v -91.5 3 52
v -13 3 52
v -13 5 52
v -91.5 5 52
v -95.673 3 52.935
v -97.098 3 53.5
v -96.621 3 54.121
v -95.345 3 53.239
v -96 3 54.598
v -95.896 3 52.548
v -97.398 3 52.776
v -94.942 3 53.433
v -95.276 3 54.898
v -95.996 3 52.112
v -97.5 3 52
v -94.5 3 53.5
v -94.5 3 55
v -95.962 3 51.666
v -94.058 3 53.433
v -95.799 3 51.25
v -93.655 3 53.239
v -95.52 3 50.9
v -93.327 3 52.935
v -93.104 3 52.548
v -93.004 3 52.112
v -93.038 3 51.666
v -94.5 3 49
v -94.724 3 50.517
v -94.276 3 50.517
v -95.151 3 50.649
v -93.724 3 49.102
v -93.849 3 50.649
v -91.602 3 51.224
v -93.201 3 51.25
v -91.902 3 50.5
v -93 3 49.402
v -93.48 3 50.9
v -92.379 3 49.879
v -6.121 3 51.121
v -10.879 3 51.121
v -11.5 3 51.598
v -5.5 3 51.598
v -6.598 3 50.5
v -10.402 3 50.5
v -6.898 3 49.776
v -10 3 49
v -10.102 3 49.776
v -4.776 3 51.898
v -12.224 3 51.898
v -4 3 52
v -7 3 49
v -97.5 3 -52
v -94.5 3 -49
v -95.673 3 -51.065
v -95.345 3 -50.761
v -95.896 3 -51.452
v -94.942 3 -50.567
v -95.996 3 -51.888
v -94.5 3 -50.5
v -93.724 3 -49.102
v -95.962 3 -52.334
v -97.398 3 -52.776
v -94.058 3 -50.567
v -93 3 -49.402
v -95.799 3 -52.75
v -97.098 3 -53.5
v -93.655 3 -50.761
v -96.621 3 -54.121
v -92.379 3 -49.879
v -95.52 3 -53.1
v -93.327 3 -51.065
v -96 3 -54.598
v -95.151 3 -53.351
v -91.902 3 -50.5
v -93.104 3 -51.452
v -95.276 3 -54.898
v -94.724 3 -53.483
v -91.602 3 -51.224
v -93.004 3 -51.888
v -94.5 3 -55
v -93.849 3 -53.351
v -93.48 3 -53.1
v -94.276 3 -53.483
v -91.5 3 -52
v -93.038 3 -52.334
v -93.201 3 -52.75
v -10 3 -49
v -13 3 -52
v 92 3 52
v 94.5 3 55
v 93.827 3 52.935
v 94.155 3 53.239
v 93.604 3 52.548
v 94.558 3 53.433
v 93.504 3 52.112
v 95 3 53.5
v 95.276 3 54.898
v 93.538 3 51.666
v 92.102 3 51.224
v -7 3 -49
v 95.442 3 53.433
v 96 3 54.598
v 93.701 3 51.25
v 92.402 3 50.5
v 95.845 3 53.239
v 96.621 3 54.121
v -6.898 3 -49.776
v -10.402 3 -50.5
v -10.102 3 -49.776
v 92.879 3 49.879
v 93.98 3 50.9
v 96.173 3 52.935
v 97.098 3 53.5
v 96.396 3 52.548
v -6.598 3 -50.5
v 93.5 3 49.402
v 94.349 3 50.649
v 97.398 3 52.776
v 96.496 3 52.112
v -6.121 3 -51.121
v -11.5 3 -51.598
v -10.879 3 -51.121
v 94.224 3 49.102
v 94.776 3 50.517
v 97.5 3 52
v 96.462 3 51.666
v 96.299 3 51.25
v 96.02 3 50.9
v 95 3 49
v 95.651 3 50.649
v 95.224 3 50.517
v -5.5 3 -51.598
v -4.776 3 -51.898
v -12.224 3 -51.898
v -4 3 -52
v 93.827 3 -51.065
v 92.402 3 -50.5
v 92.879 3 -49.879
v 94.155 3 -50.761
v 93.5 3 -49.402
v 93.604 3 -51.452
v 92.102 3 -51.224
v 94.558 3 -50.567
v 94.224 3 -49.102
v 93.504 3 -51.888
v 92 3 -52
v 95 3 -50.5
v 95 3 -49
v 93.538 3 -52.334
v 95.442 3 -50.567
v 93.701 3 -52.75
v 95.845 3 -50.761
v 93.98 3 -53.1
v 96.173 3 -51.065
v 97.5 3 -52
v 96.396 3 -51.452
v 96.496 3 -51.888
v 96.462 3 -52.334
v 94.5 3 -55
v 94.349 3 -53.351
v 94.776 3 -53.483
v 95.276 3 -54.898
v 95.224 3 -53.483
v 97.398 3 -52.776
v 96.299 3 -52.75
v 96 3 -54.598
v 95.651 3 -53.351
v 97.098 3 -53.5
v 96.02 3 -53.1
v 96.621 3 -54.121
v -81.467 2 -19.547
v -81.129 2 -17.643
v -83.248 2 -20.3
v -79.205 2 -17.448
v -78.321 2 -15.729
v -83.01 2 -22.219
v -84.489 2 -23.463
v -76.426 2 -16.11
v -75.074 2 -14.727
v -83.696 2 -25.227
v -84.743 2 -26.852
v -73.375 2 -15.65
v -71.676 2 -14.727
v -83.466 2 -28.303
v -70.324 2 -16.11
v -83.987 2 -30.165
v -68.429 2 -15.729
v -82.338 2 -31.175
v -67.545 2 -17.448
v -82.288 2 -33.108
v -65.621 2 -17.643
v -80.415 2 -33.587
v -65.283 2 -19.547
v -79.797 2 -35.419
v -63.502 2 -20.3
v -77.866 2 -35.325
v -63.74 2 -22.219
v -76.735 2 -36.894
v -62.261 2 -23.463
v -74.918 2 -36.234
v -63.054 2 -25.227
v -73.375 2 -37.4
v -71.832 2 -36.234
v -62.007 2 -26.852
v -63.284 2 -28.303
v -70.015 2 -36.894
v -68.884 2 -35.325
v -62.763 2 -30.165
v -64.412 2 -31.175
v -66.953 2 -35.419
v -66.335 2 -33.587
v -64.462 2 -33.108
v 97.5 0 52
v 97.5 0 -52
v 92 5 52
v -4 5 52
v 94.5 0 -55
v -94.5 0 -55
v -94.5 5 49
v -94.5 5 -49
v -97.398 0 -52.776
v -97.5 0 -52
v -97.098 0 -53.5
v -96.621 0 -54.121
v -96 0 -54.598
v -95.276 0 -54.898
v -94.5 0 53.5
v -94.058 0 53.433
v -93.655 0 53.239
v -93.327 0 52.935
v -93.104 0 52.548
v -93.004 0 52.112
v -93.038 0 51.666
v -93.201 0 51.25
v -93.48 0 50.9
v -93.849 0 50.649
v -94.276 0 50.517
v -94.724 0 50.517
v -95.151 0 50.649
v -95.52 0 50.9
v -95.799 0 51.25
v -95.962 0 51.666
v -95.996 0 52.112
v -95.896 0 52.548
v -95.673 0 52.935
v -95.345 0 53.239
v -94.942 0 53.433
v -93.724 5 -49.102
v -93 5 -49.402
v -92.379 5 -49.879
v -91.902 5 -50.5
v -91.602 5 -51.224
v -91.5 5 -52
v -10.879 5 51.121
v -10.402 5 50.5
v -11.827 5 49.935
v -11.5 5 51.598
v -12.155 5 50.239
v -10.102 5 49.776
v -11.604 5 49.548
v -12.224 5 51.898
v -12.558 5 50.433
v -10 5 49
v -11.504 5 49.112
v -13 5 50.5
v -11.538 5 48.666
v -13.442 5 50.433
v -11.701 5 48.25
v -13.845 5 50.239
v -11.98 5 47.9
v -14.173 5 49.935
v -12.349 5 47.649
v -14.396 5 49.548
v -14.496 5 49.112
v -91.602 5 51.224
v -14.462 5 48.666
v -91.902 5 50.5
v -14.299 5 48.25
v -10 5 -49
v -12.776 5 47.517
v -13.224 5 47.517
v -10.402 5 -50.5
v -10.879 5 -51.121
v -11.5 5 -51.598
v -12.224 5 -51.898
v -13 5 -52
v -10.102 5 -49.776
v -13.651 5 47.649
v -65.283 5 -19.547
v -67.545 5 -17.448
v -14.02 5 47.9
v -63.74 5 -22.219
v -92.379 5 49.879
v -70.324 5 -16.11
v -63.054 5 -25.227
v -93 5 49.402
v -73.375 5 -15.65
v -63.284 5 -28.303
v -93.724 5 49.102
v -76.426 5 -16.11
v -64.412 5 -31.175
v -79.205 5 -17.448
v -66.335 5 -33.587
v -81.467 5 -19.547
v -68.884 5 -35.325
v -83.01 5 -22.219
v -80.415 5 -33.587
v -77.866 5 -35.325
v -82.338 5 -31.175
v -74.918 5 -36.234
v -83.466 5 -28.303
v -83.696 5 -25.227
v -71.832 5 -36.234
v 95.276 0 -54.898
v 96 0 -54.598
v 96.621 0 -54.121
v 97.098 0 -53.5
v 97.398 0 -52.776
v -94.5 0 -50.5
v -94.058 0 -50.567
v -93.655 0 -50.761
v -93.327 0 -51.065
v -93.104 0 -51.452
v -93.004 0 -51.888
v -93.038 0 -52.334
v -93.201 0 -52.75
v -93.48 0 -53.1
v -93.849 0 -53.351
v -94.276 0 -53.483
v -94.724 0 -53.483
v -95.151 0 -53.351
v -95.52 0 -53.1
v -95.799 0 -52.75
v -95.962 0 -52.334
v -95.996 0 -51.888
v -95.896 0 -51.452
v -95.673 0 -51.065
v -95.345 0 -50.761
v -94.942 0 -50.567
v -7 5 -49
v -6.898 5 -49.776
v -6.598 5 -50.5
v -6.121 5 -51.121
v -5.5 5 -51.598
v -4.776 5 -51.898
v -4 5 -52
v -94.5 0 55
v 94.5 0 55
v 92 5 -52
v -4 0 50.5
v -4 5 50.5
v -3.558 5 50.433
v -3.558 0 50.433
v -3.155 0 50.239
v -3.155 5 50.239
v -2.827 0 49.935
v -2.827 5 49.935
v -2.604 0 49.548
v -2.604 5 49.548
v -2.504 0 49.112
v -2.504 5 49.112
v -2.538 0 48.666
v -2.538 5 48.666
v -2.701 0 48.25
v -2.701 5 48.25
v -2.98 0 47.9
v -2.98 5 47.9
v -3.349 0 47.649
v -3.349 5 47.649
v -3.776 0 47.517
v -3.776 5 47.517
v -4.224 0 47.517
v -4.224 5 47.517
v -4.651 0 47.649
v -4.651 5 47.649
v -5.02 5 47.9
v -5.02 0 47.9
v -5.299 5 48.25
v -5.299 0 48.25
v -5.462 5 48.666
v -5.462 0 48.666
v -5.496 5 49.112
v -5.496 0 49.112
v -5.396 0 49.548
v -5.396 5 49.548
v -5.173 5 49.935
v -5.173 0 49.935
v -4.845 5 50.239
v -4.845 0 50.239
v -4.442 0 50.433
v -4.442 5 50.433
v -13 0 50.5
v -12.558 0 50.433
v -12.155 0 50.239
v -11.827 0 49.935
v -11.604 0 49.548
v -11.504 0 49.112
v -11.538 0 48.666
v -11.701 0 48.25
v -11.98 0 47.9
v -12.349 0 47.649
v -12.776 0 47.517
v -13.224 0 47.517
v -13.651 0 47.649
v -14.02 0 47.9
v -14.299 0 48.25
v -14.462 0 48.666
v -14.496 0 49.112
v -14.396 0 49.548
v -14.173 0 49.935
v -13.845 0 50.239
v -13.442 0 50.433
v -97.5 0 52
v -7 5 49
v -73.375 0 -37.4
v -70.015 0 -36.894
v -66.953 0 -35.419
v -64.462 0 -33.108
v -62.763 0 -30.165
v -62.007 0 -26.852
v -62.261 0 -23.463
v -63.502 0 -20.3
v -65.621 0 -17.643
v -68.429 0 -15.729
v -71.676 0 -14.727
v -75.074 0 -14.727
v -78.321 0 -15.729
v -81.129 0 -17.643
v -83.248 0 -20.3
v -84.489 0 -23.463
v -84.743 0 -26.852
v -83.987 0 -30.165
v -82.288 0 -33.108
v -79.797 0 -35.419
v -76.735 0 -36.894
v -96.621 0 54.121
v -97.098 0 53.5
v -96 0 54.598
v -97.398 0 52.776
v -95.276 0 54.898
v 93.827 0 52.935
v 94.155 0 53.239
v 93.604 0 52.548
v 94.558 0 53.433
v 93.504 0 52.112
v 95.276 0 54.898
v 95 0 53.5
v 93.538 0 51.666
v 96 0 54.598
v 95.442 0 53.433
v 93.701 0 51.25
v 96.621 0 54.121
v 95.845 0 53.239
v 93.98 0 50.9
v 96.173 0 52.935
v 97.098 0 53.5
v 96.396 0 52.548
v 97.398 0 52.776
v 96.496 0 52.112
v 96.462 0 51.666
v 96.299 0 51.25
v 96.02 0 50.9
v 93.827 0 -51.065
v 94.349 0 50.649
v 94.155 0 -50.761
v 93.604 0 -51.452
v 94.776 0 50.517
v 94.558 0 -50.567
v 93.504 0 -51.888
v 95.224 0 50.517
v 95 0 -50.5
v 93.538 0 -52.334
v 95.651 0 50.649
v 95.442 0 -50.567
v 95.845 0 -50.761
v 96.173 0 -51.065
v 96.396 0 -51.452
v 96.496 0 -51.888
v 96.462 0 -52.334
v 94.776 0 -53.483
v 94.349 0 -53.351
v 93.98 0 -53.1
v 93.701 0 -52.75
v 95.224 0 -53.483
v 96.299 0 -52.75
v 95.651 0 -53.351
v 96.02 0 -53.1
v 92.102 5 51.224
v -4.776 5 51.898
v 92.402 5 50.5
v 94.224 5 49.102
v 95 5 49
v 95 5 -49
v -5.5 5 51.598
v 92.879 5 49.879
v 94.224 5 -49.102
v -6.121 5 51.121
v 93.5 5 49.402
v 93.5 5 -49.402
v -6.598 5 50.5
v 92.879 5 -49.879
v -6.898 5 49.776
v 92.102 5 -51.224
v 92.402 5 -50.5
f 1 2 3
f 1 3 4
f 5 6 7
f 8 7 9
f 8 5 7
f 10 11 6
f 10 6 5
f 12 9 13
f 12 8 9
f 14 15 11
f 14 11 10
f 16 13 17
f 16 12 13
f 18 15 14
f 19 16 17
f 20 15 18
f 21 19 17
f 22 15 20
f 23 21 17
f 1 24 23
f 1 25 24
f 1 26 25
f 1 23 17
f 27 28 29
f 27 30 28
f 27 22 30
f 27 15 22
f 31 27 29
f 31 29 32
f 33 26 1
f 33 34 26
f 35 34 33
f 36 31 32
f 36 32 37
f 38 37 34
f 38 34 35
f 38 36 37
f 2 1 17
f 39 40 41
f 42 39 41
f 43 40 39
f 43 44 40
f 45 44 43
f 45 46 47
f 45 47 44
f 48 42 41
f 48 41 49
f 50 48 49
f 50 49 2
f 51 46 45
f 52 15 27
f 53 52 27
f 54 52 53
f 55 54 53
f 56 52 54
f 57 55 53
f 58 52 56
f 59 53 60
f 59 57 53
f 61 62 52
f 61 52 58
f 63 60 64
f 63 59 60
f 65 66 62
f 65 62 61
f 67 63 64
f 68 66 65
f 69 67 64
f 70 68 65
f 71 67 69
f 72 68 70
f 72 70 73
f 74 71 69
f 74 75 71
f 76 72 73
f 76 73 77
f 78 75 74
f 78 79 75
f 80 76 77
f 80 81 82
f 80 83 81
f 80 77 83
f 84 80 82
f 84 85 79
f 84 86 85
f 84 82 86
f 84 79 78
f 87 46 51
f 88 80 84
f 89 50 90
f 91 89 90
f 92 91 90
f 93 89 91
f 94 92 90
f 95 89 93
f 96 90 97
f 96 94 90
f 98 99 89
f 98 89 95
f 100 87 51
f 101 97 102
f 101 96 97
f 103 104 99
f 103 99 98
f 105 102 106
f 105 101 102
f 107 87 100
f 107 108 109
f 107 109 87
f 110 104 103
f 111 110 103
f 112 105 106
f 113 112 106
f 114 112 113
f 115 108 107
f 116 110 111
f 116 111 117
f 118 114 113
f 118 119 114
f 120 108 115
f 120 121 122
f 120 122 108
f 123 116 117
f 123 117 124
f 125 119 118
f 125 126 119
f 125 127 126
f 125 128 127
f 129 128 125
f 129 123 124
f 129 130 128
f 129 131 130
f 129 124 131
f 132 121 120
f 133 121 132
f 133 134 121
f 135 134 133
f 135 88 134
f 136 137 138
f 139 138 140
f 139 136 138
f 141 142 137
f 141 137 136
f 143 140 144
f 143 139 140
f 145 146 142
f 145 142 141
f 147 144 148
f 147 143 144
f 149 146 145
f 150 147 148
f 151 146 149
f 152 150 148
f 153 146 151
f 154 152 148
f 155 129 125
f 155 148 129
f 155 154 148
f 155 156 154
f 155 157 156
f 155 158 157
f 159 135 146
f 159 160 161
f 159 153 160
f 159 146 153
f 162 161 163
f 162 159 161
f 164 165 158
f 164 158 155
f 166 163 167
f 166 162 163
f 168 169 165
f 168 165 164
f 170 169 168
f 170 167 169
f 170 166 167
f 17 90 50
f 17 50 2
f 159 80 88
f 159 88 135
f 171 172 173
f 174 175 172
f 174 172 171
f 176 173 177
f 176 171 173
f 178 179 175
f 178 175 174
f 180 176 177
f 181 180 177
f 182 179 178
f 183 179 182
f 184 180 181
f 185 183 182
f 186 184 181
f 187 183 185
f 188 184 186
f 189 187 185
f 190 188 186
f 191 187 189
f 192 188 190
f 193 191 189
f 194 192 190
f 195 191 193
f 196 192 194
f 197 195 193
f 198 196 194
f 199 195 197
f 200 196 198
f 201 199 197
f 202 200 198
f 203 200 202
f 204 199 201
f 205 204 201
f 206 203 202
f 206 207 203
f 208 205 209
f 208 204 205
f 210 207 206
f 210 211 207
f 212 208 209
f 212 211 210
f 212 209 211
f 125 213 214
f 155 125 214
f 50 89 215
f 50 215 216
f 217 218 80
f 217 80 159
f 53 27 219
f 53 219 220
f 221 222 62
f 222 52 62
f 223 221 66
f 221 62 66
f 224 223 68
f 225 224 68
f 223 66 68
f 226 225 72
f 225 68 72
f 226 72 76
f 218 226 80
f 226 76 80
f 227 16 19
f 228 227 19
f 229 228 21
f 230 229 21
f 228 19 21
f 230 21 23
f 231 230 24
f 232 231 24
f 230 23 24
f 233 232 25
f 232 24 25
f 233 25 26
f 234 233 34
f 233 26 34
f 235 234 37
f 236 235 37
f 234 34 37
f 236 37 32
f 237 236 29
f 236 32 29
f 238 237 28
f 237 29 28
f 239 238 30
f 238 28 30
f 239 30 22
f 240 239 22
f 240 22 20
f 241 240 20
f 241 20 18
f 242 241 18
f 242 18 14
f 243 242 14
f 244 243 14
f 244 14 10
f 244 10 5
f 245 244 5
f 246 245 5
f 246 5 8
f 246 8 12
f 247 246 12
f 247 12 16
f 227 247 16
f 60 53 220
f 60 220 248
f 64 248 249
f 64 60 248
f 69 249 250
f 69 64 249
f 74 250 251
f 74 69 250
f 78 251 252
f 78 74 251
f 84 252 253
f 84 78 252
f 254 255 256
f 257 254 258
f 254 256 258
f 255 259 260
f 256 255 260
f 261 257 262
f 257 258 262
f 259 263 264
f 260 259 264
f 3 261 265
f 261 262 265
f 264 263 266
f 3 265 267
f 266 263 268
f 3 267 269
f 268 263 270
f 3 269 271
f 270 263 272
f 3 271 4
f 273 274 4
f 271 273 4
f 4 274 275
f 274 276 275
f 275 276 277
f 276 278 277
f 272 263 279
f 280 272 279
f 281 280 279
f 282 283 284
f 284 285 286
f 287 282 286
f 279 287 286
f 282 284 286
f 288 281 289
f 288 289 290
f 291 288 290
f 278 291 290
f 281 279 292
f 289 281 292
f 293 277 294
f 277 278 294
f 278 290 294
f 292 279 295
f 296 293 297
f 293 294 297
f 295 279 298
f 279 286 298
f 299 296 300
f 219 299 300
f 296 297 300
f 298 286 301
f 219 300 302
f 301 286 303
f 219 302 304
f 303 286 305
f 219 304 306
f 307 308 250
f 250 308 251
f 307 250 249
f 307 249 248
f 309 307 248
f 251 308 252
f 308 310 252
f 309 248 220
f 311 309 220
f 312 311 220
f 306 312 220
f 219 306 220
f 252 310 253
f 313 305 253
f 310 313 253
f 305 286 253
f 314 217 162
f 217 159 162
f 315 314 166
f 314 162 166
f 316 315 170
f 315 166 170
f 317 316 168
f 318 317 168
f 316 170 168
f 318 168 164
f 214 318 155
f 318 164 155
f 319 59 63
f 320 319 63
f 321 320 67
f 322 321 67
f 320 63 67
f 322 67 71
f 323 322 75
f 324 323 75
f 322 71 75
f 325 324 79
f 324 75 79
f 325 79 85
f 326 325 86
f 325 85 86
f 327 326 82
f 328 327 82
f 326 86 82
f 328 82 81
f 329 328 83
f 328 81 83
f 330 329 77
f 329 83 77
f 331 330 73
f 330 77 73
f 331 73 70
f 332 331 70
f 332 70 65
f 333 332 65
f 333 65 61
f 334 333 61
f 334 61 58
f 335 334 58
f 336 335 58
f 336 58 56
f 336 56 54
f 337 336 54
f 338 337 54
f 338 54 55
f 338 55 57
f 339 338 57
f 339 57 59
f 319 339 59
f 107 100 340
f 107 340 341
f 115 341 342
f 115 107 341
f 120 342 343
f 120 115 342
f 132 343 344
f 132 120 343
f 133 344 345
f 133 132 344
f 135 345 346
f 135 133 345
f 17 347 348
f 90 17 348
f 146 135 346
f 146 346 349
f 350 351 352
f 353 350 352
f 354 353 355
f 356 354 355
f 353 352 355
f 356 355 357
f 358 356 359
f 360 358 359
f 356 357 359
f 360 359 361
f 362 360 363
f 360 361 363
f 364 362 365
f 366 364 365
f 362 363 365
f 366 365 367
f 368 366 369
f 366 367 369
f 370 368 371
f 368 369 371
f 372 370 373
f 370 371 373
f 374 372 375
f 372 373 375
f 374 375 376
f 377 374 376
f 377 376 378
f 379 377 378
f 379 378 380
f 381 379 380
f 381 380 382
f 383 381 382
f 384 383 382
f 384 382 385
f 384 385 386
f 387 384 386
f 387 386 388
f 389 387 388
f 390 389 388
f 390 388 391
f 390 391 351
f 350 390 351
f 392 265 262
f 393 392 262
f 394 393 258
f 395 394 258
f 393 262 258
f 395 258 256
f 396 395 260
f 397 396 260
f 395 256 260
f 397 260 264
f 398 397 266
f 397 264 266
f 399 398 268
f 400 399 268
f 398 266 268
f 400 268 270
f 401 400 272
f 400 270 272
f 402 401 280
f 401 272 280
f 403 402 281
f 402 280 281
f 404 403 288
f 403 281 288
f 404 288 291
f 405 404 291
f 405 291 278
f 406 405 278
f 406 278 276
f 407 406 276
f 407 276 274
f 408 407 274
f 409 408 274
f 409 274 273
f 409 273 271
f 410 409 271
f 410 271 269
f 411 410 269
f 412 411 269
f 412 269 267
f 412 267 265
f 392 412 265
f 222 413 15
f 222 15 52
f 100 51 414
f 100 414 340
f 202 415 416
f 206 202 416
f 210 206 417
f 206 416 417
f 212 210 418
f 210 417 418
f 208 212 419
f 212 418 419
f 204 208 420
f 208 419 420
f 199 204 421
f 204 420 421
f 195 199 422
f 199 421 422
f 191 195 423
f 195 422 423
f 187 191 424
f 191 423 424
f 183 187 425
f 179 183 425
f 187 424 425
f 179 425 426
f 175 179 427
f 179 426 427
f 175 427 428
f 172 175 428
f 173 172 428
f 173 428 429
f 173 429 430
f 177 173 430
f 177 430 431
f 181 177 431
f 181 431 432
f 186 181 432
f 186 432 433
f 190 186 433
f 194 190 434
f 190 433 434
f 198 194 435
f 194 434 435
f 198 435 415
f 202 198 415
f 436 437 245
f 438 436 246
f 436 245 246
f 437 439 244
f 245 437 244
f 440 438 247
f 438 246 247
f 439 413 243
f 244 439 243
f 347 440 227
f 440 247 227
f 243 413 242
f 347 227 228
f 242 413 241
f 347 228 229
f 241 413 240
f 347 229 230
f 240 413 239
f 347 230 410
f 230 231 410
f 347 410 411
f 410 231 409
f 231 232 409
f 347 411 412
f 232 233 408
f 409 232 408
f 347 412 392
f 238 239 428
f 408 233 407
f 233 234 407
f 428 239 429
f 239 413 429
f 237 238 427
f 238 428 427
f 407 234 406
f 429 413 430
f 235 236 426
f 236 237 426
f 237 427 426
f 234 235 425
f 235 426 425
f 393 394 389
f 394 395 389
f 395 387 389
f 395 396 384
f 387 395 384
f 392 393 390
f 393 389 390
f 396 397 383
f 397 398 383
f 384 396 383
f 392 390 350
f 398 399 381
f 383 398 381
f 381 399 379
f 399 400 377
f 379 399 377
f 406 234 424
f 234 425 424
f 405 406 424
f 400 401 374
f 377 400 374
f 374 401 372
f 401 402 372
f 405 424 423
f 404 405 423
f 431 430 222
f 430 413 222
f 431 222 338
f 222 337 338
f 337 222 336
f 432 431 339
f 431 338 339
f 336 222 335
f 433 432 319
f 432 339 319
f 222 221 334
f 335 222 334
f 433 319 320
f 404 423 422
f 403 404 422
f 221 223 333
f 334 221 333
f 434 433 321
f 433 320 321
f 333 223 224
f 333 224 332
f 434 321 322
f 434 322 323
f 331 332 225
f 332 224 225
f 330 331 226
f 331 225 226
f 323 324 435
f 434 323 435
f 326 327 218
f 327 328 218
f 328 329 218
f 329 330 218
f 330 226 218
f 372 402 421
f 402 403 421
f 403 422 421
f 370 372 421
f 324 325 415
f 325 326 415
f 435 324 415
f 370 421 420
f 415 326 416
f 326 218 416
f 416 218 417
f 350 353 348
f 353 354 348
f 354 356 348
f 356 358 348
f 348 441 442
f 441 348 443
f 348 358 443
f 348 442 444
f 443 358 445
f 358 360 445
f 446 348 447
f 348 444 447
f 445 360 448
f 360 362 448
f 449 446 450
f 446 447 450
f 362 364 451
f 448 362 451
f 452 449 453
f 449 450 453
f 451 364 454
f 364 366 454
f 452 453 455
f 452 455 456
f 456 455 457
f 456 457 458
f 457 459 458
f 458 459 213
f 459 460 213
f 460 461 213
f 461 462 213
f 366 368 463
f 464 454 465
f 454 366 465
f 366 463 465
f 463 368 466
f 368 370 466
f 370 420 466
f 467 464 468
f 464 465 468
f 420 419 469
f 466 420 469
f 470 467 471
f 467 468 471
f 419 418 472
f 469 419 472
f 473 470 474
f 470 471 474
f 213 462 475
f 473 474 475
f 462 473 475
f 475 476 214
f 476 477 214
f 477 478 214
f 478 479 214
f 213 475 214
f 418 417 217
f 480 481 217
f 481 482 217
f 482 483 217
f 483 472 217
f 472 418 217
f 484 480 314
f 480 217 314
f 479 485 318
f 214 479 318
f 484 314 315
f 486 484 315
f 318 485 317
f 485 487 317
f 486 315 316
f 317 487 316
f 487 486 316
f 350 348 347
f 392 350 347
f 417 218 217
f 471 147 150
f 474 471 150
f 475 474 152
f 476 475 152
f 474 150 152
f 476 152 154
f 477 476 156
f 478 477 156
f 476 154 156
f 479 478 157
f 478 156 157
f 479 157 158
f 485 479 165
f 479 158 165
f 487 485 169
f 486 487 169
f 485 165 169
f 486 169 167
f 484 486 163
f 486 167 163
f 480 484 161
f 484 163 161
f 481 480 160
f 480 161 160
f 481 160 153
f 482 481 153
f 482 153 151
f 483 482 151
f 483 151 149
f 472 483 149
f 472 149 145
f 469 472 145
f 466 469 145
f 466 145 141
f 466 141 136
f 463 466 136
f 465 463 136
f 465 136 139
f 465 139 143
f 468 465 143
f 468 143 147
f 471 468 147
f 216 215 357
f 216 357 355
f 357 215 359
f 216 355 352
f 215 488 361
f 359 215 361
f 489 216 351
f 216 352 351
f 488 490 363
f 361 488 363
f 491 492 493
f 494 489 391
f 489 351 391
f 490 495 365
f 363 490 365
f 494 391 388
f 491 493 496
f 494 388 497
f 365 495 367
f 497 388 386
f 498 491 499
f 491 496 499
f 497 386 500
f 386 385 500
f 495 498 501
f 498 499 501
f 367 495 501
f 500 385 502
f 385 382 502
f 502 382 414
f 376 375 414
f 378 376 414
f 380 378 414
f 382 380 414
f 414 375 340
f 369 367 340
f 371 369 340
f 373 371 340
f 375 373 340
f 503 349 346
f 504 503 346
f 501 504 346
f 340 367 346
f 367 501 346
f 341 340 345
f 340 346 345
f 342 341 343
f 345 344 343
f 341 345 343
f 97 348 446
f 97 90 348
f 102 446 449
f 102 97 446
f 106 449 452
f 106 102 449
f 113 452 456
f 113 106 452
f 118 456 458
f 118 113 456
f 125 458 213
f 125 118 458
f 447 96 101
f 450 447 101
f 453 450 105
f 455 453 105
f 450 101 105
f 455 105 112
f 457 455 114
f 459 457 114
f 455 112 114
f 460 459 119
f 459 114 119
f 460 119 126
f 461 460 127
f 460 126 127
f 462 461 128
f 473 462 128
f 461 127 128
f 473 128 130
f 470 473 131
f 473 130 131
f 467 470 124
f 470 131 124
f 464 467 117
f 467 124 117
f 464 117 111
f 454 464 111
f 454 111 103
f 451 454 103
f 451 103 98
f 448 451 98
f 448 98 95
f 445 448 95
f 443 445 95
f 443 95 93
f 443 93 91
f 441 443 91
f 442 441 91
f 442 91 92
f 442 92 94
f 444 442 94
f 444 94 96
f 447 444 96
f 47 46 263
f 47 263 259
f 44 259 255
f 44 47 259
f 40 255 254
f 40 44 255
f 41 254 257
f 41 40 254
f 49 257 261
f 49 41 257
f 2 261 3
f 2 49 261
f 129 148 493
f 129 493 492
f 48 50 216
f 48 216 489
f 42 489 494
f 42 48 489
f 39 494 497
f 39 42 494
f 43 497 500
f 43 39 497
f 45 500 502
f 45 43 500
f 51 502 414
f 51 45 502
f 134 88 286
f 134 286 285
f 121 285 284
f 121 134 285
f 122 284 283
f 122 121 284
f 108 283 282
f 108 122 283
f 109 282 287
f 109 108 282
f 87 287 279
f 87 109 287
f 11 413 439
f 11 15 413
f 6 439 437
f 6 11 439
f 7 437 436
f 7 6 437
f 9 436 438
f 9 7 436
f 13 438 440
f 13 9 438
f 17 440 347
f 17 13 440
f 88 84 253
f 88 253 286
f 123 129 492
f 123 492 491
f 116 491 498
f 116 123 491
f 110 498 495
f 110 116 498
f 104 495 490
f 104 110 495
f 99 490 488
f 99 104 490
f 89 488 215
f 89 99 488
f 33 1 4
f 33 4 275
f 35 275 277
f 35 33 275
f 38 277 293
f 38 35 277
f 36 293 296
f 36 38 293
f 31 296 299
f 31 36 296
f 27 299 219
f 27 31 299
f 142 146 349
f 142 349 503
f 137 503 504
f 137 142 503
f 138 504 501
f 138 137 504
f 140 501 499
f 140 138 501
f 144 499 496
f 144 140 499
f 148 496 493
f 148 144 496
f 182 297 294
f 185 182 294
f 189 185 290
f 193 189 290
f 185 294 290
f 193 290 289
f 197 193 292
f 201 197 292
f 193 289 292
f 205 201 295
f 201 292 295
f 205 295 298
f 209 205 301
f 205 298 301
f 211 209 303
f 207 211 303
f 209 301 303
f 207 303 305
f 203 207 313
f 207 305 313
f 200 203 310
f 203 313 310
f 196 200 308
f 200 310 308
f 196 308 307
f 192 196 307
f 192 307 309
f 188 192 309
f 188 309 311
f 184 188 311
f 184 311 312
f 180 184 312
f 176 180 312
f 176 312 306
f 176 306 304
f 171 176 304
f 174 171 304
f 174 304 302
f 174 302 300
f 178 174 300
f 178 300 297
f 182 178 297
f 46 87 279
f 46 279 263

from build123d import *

# Parameters (mm, degrees)
SKETCH1_W           = 195
SKETCH1_H           = 110
BOSS_EXTRUDE1_DEPTH = 3
BOSS_EXTRUDE2_DEPTH = 2
SKETCH4_R           = 1.5
CUT_EXTRUDE2_DEPTH  = 112.983257677
FILLET1_R           = 3
SKETCH5_R           = 1.5
CUT_EXTRUDE3_DEPTH  = 113.054674155
SKETCH6_R           = 10.35
CUT_EXTRUDE4_DEPTH  = 113.054674155
SKETCH7_R           = 11.4
CUT_EXTRUDE5_DEPTH  = 2


with BuildPart() as part:
    # Sketch1 → Boss-Extrude1 (new body)
    with BuildSketch(Plane(origin=(0, 0, 0), x_dir=(1, 0, 0), z_dir=(0, 1, 0))):
        Rectangle(SKETCH1_W, SKETCH1_H)
    extrude(amount=BOSS_EXTRUDE1_DEPTH)

    # Sketch2 → Boss-Extrude2 (add)
    with BuildSketch(Plane(origin=(0, 3, 0), x_dir=(1, 0, 0), z_dir=(0, 1, 0))):
        with BuildLine():
            Line((-94.5, 0), (-94.5, 49))
            ThreePointArc((-94.5, 49), (-92.378679656, 49.878679656), (-91.5, 52))
            Line((-91.5, 52), (-13, 52))
            ThreePointArc((-13, 52), (-10.878679656, 51.121320344), (-10, 49))
            Line((-10, 49), (-10, -49))
            ThreePointArc((-10, -49), (-10.878679656, -51.121320344), (-13, -52))
            Line((-13, -52), (-91.5, -52))
            ThreePointArc((-91.5, -52), (-92.378679656, -49.878679656), (-94.5, -49))
            Line((-94.5, -49), (-94.5, 0))
        make_face()
        with BuildLine():
            Line((-7, 0), (-7, 49))
            ThreePointArc((-7, 49), (-6.121320344, 51.121320344), (-4, 52))
            Line((-4, 52), (92, 52))
            ThreePointArc((92, 52), (92.878679656, 49.878679656), (95, 49))
            Line((95, 49), (95, -49))
            ThreePointArc((95, -49), (92.878679656, -49.878679656), (92, -52))
            Line((92, -52), (-4, -52))
            ThreePointArc((-4, -52), (-6.121320344, -51.121320344), (-7, -49))
            Line((-7, -49), (-7, 0))
        make_face()
    extrude(amount=BOSS_EXTRUDE2_DEPTH)

    # Sketch4 → Cut-Extrude2 (cut, through all)
    with BuildSketch(Plane(origin=(0, 3, 0), x_dir=(1, 0, 0), z_dir=(0, 1, 0))):
        with Locations(Location((-94.5, 52, 0), (0, 0, 270))):
            Circle(SKETCH4_R)
        with Locations(Location((95, 52, 0), (0, 0, 270))):
            Circle(SKETCH4_R)
        with Locations(Location((95, -52, 0), (0, 0, 270))):
            Circle(SKETCH4_R)
        with Locations(Location((-94.5, -52, 0), (0, 0, 270))):
            Circle(SKETCH4_R)
    extrude(amount=-CUT_EXTRUDE2_DEPTH, mode=Mode.SUBTRACT)

    # Fillet1
    fillet1_edges = [part.edges().sort_by_distance(p)[0] for p in [
        (97.5, 1.5, 55),
        (-97.5, 1.5, 55),
        (-97.5, 1.5, -55),
        (97.5, 1.5, -55),
    ]]
    fillet(fillet1_edges, radius=FILLET1_R)

    # Sketch5 → Cut-Extrude3 (cut, through all)
    with BuildSketch(Plane(origin=(0, 5, 0), x_dir=(1, 0, 0), z_dir=(0, 1, 0))):
        with Locations(Location((-13, -49, 0), (0, 0, 270))):
            Circle(SKETCH5_R)
        with Locations(Location((-4, -49, 0), (0, 0, 270))):
            Circle(SKETCH5_R)
    extrude(amount=-CUT_EXTRUDE3_DEPTH, mode=Mode.SUBTRACT)

    # Sketch6 → Cut-Extrude4 (cut, through all)
    with BuildSketch(Plane(origin=(0, 5, 0), x_dir=(1, 0, 0), z_dir=(0, 1, 0))):
        with Locations(Location((-73.375, 26, 0), (0, 0, 270))):
            Circle(SKETCH6_R)
    extrude(amount=-CUT_EXTRUDE4_DEPTH, mode=Mode.SUBTRACT)

    # Sketch7 → Cut-Extrude5 (cut)
    with BuildSketch(Plane.XZ):
        with Locations(Location((-73.375, -26, 0), (0, 0, 270))):
            Circle(SKETCH7_R)
    extrude(amount=-CUT_EXTRUDE5_DEPTH, mode=Mode.SUBTRACT)


solid = part.part
